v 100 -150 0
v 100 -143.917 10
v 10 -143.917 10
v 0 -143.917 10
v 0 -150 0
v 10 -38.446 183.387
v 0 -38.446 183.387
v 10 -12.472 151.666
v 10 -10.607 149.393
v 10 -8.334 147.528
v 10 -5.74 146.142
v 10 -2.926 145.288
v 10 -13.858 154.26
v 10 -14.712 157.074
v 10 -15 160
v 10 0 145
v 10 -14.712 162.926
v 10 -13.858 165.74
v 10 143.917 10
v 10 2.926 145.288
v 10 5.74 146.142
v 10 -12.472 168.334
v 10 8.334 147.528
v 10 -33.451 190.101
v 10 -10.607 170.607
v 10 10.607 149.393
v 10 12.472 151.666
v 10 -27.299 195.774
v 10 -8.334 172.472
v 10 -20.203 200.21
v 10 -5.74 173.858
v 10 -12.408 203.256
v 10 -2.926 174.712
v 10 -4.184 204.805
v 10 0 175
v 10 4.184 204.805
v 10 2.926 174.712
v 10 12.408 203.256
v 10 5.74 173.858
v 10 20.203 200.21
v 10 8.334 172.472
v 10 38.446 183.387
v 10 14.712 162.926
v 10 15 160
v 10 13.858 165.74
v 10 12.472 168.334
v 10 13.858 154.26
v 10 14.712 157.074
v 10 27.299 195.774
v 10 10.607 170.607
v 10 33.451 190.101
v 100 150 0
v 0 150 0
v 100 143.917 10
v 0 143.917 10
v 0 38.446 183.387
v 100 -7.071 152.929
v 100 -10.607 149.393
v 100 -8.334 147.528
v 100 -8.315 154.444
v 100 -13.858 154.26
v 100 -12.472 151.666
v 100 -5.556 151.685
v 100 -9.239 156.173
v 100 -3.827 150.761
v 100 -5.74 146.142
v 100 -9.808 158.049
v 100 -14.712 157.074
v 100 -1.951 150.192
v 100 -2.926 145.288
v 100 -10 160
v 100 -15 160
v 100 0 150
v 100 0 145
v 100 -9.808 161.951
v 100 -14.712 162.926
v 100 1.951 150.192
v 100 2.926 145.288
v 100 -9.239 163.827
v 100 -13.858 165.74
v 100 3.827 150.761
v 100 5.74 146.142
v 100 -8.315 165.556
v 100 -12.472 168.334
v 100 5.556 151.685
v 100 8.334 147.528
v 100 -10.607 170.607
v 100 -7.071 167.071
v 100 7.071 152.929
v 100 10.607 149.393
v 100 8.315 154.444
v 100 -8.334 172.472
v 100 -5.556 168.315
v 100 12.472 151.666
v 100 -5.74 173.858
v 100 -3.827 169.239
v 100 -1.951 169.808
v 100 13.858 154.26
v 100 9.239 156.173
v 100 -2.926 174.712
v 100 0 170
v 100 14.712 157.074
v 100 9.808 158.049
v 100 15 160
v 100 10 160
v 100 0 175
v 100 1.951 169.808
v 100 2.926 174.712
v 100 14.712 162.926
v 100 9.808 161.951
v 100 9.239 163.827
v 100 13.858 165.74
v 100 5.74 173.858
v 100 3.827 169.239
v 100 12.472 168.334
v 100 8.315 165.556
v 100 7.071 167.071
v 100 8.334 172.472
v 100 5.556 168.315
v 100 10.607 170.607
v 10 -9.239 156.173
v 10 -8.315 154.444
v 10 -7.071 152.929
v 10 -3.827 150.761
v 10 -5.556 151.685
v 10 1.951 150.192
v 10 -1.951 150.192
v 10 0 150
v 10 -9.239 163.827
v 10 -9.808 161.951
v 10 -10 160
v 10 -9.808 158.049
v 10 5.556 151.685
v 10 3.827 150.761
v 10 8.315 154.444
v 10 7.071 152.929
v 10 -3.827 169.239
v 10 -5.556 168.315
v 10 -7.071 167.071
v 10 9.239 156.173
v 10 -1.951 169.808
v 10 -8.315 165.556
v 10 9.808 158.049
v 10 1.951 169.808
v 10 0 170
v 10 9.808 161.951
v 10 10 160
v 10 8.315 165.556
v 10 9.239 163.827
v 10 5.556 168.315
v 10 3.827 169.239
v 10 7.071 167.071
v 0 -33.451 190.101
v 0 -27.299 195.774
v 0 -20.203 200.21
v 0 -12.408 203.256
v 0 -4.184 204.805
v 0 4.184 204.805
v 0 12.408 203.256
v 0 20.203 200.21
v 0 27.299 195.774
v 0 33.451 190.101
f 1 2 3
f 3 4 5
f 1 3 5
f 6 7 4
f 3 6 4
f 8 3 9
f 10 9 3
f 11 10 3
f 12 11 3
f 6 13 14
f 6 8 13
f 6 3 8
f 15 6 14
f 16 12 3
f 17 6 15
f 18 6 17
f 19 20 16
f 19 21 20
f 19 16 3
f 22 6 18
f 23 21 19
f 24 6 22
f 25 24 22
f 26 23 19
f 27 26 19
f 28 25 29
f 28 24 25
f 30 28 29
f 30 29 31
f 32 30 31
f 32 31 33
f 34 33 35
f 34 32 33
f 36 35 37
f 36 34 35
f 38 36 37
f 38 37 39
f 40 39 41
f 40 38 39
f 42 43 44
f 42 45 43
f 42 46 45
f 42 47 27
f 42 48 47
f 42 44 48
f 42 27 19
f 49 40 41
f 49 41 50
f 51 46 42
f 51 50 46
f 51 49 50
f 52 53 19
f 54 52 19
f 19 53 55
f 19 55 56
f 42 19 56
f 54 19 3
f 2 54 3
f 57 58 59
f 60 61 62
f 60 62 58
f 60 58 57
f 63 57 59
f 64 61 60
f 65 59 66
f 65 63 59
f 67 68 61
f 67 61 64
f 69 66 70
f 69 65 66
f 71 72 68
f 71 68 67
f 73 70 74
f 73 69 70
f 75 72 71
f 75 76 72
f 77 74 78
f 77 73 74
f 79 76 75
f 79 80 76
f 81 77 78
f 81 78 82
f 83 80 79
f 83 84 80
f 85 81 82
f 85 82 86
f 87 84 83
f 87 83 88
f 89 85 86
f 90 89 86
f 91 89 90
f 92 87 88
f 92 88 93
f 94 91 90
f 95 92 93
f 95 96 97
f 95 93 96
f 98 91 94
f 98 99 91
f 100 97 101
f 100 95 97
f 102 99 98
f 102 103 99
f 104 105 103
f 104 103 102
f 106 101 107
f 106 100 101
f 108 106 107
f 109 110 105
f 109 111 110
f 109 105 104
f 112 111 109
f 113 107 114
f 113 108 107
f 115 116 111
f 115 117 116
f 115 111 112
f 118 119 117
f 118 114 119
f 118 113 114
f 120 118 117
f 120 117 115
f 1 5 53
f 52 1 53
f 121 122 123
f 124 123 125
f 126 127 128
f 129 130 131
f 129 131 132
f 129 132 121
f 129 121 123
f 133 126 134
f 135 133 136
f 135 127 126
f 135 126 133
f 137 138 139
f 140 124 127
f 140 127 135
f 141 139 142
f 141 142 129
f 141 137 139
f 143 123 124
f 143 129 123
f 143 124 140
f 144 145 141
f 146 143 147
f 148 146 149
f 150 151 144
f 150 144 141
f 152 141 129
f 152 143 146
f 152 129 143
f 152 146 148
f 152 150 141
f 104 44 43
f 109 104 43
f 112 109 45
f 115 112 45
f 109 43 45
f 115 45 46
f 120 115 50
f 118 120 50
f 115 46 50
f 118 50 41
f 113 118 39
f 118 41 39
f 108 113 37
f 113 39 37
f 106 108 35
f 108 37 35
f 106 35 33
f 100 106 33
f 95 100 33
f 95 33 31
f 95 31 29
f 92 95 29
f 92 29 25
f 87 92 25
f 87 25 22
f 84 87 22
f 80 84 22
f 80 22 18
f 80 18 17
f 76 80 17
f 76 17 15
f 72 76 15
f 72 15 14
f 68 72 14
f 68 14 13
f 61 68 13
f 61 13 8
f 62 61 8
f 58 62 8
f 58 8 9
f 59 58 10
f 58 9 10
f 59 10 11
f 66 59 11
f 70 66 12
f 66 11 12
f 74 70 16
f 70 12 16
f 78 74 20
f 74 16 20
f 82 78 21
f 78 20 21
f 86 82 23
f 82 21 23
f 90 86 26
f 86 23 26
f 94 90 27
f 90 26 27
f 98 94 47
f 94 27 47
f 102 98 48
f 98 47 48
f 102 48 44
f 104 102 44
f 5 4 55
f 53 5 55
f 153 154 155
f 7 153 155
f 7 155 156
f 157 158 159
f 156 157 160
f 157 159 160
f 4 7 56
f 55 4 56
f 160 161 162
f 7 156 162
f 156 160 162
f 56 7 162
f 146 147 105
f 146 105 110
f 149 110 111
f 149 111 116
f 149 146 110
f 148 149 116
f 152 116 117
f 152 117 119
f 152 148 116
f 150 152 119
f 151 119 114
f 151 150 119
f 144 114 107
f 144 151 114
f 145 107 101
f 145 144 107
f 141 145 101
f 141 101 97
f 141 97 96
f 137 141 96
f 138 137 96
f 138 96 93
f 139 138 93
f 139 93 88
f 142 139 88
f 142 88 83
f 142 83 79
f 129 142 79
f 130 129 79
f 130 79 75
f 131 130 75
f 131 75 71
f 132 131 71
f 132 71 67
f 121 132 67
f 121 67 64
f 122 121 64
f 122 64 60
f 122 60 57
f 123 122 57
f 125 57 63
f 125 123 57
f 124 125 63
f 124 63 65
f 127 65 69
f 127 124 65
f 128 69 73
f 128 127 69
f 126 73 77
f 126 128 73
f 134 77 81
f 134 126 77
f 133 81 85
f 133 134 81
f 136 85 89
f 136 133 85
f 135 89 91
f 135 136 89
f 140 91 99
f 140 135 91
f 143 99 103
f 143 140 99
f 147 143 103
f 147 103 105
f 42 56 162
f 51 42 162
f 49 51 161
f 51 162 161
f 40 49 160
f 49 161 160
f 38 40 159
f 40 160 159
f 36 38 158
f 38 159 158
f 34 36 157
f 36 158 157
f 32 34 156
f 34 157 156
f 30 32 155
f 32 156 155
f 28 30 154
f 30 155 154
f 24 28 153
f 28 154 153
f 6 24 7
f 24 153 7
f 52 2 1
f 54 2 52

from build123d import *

# Parameters (mm, degrees)
F0_R     = 15
F1_DEPTH = 10
F0_R_2   = 10
F2_DEPTH = 100
F0_R_3   = 8
F3_DEPTH = 10
F4_DEPTH = 10
F5_DEPTH = 100


with BuildPart() as f1:
    # F0 (on Right) → F1 (new body)
    with BuildSketch(Plane.YZ):
        Polygon((-150, 0), (0, 0), (150, 0), (143.916984, 10), (0, 10), (-143.916984, 10), align=None)
        with BuildLine():
            Line((-38.445662, 183.386558), (-143.916984, 10))
            Line((-143.916984, 10), (0, 10))
            Line((0, 10), (143.916984, 10))
            Line((143.916984, 10), (38.445662, 183.386558))
            ThreePointArc((38.445662, 183.386558), (43.330444, 172.14383), (45, 160))
            ThreePointArc((45, 160), (-12.14383, 116.669556), (-38.445662, 183.386558))
        make_face()
        with BuildLine():
            ThreePointArc((38.445662, 183.386558), (0, 205), (-38.445662, 183.386558))
            ThreePointArc((-38.445662, 183.386558), (-12.14383, 116.669556), (45, 160))
            ThreePointArc((45, 160), (43.330444, 172.14383), (38.445662, 183.386558))
        make_face()
        with Locations((0, 160)):
            Circle(F0_R, mode=Mode.SUBTRACT)
    extrude(amount=F1_DEPTH)

    # F0 (on Right) → F2 (join)
    with BuildSketch(Plane.YZ):
        with Locations((0, 160)):
            Circle(F0_R)
        with Locations((0, 160)):
            Circle(F0_R_2, mode=Mode.SUBTRACT)
    extrude(amount=F2_DEPTH)

    # F0 (on Right) → F3 (join)
    with BuildSketch(Plane.YZ):
        with Locations((0, 160)):
            Circle(F0_R_2)
        with Locations((0, 160)):
            Circle(F0_R_3, mode=Mode.SUBTRACT)
    extrude(amount=F3_DEPTH)

    # F0 (on Right) → F4 (join)
    with BuildSketch(Plane.YZ):
        with Locations((0, 160)):
            Circle(F0_R_3)
    extrude(amount=F4_DEPTH)

    # F0 (on Right) → F5 (join)
    with BuildSketch(Plane.YZ):
        Polygon((-150, 0), (0, 0), (150, 0), (143.916984, 10), (0, 10), (-143.916984, 10), align=None)
    extrude(amount=F5_DEPTH)


solid = f1.part
